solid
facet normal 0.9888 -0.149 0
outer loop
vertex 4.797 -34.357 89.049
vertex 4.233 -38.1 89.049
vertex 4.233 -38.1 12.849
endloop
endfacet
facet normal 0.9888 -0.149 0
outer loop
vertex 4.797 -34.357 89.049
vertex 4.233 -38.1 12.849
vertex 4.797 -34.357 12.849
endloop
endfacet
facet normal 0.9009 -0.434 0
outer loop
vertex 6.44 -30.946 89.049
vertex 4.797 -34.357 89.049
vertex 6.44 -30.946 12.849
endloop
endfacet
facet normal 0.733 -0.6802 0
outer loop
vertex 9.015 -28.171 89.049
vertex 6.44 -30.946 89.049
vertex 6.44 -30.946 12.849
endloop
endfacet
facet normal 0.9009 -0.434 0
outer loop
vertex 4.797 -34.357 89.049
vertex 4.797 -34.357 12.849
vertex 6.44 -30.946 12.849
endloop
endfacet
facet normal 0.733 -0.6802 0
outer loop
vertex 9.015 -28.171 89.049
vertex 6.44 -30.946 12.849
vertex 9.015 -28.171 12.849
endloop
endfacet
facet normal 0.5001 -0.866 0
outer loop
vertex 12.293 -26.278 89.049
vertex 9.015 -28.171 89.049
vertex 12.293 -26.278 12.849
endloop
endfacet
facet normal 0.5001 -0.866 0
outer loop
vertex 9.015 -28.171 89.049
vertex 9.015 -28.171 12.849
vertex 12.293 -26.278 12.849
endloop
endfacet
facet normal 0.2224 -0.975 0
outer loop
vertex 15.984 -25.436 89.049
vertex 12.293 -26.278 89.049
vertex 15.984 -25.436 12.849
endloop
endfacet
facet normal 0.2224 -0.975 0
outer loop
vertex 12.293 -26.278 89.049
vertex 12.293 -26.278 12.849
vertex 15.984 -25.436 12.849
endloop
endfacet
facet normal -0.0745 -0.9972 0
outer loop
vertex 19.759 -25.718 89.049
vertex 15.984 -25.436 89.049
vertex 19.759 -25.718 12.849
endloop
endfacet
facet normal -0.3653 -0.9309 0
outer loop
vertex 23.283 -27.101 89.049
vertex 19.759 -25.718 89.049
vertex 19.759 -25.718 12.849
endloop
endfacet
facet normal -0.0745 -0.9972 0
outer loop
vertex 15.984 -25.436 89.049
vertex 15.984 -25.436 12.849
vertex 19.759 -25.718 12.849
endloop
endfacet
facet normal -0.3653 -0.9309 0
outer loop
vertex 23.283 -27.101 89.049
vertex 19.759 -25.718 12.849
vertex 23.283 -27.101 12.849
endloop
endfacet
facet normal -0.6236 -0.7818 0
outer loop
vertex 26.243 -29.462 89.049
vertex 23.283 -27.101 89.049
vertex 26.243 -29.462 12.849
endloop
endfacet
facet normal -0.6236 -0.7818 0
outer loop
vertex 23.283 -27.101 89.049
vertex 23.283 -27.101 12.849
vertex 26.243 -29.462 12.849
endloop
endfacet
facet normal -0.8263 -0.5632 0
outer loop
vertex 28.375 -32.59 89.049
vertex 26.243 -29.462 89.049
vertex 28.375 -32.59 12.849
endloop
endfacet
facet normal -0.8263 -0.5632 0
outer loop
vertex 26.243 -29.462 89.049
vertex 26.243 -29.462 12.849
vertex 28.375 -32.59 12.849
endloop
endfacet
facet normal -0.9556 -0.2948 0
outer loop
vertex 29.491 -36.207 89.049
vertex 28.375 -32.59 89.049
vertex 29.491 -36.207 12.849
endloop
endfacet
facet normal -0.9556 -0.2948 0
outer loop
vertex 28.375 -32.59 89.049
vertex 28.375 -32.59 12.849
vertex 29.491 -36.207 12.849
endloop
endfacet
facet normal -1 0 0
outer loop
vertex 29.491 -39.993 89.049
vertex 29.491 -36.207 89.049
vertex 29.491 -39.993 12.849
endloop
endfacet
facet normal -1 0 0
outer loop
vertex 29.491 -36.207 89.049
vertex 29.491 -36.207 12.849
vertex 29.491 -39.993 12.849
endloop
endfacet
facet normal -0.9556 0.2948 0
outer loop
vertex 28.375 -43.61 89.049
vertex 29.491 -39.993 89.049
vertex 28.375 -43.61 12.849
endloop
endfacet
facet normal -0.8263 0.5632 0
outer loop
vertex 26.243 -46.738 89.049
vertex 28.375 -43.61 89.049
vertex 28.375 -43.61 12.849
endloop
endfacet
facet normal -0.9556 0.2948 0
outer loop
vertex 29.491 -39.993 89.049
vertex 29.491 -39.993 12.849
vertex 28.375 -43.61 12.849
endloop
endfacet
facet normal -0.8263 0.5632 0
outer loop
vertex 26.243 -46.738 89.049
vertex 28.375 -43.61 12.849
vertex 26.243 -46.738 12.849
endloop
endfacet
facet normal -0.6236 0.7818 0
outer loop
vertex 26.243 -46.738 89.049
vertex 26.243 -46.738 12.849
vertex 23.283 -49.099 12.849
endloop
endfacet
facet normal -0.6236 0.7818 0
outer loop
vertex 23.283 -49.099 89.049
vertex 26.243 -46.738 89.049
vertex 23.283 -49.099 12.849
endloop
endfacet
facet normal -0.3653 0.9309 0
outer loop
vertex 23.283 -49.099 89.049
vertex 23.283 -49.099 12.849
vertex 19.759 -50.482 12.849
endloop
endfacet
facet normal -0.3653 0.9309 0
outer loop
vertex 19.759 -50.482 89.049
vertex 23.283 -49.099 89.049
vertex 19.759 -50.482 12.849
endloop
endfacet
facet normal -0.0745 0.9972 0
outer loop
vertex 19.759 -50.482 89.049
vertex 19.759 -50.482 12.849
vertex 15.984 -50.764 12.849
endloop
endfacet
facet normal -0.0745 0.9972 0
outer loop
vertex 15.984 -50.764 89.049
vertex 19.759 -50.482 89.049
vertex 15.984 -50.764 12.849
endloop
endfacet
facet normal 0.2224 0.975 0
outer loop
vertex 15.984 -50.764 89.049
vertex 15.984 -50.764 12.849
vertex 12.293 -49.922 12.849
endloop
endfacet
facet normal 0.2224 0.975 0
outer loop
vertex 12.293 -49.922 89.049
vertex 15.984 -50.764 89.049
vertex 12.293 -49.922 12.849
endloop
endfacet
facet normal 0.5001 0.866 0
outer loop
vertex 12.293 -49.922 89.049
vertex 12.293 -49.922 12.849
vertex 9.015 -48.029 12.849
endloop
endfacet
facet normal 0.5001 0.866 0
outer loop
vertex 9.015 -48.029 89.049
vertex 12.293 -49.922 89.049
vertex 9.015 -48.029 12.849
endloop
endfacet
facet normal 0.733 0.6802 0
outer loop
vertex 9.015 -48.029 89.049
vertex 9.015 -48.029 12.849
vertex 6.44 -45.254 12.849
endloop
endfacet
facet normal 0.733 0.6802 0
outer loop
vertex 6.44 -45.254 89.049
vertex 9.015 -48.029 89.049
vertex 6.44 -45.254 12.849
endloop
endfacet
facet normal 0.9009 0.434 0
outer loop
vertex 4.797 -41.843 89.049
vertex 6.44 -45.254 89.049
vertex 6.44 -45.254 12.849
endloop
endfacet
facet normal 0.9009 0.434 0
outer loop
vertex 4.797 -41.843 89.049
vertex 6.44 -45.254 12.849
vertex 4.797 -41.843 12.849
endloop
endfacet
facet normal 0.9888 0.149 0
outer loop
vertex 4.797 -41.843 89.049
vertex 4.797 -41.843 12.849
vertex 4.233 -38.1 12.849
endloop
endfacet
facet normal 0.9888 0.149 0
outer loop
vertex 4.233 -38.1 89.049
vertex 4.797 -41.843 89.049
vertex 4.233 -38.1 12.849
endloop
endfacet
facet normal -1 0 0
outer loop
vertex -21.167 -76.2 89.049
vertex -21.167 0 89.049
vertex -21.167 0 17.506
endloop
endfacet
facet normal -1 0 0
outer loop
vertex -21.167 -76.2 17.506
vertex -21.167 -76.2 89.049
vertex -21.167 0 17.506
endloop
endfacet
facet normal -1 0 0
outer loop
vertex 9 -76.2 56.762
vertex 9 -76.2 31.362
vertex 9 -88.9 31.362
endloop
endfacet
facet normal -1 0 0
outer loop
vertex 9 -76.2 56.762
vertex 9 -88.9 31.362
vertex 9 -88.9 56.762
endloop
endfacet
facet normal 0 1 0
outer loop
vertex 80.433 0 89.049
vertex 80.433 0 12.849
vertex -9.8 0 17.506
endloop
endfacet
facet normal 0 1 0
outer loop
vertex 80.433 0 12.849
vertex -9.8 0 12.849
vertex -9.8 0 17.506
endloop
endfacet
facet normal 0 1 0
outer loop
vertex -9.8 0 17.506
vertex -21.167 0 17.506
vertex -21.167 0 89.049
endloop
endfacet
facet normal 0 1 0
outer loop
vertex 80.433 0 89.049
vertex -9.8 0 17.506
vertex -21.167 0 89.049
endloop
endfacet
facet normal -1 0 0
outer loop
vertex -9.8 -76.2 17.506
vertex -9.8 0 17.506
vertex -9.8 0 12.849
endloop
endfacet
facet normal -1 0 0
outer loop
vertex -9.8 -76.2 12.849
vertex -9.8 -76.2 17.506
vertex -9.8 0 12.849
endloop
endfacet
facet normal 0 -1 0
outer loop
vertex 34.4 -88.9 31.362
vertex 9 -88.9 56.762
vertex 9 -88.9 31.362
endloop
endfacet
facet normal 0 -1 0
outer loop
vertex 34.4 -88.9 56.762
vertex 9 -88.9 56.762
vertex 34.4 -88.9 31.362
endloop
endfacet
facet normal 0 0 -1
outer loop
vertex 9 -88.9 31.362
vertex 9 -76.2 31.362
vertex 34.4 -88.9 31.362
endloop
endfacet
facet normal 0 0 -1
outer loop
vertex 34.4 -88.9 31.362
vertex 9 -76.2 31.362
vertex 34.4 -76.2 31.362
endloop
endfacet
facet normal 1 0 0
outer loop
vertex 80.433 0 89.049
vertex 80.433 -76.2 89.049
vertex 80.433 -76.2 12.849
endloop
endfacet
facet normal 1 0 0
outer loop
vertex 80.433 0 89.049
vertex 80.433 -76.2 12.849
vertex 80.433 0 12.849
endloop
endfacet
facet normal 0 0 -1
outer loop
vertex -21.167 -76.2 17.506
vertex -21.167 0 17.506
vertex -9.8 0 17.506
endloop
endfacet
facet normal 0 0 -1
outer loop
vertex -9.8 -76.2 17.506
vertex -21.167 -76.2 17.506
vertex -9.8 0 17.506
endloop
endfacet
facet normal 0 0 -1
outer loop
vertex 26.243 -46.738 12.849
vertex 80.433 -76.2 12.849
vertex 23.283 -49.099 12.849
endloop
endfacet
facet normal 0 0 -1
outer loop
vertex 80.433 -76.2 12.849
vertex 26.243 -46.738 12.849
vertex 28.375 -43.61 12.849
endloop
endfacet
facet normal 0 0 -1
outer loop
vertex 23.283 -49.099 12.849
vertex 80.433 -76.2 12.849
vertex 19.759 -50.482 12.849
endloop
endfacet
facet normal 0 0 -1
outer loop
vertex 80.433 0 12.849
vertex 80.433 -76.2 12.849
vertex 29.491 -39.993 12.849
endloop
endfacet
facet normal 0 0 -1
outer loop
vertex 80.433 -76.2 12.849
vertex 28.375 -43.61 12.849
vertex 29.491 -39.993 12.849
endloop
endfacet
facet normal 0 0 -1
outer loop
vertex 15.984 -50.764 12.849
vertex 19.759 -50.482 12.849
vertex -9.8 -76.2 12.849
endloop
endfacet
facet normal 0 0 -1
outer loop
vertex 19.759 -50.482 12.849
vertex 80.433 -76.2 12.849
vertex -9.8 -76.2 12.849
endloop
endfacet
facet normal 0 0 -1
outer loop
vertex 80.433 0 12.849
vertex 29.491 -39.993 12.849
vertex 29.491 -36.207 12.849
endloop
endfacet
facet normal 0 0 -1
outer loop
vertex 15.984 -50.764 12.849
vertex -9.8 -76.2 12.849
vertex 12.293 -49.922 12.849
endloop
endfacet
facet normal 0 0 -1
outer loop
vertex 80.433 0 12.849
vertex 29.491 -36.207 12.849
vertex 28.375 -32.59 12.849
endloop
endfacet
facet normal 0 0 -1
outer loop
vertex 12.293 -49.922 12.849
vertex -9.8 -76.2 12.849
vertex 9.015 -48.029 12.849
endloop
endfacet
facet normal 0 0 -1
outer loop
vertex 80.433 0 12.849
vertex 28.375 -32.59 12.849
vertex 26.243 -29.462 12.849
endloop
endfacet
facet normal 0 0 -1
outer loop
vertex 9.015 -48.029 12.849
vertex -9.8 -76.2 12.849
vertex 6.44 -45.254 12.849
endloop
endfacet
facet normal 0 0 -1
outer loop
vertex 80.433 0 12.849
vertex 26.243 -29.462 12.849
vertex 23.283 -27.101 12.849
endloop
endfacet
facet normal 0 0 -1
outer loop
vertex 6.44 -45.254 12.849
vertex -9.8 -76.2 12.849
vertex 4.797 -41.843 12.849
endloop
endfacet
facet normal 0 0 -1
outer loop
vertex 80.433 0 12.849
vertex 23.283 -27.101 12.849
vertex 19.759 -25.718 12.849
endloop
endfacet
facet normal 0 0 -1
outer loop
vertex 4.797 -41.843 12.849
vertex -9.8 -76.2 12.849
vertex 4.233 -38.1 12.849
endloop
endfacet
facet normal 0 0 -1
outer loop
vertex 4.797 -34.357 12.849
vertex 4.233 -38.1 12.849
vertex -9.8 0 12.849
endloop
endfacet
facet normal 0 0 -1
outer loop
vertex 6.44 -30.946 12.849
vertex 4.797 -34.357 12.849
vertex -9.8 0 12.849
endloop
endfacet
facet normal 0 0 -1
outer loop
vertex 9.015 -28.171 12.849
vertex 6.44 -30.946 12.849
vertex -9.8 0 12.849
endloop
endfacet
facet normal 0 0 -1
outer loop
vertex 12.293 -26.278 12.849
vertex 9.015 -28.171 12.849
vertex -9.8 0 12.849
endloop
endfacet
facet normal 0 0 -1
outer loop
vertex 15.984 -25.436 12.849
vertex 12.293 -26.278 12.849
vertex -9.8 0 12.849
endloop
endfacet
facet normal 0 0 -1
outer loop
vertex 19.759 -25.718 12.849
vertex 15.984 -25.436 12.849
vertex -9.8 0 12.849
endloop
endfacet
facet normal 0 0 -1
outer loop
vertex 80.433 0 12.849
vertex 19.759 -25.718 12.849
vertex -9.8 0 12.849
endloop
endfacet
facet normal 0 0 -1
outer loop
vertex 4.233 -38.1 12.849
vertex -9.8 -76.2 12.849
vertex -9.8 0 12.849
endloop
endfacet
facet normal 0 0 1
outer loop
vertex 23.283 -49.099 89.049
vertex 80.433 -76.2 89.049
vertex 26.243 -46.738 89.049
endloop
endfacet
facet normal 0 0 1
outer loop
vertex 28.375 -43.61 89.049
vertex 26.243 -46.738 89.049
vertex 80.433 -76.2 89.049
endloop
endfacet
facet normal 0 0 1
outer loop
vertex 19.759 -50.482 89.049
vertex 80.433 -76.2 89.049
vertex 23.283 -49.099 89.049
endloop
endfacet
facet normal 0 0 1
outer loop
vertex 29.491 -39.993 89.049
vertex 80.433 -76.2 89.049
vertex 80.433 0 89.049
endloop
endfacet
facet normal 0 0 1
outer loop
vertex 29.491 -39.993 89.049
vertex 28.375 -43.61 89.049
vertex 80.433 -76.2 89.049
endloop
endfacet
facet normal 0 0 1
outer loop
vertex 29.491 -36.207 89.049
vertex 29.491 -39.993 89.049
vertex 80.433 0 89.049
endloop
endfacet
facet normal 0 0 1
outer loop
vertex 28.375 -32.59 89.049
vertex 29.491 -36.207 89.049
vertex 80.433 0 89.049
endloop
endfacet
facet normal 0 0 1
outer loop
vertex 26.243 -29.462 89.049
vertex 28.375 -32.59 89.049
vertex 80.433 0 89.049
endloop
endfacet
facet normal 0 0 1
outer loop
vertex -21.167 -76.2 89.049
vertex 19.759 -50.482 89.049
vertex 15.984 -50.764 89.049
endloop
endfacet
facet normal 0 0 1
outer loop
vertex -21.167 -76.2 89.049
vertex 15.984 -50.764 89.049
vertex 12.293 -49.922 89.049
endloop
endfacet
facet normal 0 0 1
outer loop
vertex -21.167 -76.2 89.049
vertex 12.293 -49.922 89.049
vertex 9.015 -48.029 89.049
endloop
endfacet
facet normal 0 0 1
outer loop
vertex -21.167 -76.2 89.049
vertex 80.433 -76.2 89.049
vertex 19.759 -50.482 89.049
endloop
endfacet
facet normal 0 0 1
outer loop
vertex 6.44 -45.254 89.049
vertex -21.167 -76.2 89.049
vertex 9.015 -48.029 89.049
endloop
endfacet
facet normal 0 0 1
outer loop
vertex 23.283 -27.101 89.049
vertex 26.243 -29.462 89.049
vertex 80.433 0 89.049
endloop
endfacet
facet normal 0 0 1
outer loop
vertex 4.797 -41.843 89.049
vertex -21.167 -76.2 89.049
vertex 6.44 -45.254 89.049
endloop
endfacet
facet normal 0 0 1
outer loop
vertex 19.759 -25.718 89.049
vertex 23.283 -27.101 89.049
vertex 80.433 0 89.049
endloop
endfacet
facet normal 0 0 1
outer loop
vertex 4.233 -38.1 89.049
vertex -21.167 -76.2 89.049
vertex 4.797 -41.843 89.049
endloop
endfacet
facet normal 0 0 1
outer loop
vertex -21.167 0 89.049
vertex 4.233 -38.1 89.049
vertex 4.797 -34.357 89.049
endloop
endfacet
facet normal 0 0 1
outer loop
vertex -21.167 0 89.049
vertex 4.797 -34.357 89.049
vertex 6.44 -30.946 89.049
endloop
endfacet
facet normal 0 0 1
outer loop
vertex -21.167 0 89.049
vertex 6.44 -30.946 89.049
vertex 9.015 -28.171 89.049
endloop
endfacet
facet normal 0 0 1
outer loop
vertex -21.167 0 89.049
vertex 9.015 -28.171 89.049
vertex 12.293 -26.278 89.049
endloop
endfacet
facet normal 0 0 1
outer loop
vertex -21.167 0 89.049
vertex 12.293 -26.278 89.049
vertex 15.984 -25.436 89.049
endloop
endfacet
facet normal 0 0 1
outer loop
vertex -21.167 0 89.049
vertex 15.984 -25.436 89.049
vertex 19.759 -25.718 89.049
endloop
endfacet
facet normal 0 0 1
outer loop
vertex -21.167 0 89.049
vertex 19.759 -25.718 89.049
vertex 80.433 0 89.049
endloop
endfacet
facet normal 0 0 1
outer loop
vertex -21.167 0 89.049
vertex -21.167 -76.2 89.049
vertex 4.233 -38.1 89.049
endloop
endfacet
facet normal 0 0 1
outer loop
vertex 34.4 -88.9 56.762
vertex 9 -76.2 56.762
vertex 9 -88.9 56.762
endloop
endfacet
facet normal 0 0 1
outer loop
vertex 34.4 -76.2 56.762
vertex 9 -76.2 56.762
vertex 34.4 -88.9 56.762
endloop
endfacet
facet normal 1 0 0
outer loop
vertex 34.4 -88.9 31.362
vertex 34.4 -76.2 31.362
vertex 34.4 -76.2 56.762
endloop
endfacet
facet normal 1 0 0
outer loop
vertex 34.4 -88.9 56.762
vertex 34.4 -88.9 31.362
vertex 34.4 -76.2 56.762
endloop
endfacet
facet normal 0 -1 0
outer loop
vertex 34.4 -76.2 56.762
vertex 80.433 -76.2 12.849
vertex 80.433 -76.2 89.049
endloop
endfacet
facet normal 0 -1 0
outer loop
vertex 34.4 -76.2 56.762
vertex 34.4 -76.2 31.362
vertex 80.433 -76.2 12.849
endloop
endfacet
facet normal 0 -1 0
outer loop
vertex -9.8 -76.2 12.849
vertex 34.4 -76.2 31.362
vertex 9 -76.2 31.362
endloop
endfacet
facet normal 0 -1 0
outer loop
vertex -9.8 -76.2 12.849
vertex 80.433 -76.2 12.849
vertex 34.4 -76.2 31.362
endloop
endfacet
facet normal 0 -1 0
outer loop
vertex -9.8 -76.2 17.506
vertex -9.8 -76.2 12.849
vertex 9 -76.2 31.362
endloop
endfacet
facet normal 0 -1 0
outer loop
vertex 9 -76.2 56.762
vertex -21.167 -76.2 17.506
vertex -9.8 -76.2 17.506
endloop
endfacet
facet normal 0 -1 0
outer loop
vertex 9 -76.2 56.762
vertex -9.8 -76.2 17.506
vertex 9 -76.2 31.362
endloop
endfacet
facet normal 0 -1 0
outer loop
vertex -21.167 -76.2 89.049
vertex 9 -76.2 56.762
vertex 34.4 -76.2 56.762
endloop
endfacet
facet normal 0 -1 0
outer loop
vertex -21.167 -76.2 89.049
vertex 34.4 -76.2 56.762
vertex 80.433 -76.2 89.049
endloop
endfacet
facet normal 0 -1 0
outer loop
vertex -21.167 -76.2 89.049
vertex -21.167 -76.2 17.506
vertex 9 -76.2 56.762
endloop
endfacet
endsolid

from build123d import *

# Parameters (mm, degrees)
F1_DEPTH = 76.2
F2_W     = 25.4
F2_H     = 25.4
F3_DEPTH = 12.7
F4_W     = 76.2
F4_H     = 76.2
F6_DEPTH = 25.4
F7_D     = 25.4


with BuildPart() as f1:
    # F0 (on Front) → F1 (new body)
    with BuildSketch(Plane.XZ):
        Polygon((-21.166943, 89.049337), (-21.166943, 17.506457), (-9.800089, 17.506457), (-9.800089, 12.849337), (55.033057, 12.849337), (55.033057, 89.049337), align=None)
    extrude(amount=F1_DEPTH)

    # F2 (on face) → F3 (join)
    with BuildSketch(Plane.XZ.offset(76.2)):
        with Locations((21.700043, 44.061859)):
            Rectangle(F2_W, F2_H)
    extrude(amount=F3_DEPTH)

    # F4 (on face) → F6 (join)
    with BuildSketch(Plane.YZ.offset(55.033057)):
        with Locations((-38.1, 50.949337)):
            Rectangle(F4_W, F4_H)
    extrude(amount=F6_DEPTH)

    # F7 (through all)
    with Locations(Plane.XY.offset(89.049337)):
        with Locations((16.933057, -38.1)):
            Hole(F7_D / 2)


solid = f1.part
